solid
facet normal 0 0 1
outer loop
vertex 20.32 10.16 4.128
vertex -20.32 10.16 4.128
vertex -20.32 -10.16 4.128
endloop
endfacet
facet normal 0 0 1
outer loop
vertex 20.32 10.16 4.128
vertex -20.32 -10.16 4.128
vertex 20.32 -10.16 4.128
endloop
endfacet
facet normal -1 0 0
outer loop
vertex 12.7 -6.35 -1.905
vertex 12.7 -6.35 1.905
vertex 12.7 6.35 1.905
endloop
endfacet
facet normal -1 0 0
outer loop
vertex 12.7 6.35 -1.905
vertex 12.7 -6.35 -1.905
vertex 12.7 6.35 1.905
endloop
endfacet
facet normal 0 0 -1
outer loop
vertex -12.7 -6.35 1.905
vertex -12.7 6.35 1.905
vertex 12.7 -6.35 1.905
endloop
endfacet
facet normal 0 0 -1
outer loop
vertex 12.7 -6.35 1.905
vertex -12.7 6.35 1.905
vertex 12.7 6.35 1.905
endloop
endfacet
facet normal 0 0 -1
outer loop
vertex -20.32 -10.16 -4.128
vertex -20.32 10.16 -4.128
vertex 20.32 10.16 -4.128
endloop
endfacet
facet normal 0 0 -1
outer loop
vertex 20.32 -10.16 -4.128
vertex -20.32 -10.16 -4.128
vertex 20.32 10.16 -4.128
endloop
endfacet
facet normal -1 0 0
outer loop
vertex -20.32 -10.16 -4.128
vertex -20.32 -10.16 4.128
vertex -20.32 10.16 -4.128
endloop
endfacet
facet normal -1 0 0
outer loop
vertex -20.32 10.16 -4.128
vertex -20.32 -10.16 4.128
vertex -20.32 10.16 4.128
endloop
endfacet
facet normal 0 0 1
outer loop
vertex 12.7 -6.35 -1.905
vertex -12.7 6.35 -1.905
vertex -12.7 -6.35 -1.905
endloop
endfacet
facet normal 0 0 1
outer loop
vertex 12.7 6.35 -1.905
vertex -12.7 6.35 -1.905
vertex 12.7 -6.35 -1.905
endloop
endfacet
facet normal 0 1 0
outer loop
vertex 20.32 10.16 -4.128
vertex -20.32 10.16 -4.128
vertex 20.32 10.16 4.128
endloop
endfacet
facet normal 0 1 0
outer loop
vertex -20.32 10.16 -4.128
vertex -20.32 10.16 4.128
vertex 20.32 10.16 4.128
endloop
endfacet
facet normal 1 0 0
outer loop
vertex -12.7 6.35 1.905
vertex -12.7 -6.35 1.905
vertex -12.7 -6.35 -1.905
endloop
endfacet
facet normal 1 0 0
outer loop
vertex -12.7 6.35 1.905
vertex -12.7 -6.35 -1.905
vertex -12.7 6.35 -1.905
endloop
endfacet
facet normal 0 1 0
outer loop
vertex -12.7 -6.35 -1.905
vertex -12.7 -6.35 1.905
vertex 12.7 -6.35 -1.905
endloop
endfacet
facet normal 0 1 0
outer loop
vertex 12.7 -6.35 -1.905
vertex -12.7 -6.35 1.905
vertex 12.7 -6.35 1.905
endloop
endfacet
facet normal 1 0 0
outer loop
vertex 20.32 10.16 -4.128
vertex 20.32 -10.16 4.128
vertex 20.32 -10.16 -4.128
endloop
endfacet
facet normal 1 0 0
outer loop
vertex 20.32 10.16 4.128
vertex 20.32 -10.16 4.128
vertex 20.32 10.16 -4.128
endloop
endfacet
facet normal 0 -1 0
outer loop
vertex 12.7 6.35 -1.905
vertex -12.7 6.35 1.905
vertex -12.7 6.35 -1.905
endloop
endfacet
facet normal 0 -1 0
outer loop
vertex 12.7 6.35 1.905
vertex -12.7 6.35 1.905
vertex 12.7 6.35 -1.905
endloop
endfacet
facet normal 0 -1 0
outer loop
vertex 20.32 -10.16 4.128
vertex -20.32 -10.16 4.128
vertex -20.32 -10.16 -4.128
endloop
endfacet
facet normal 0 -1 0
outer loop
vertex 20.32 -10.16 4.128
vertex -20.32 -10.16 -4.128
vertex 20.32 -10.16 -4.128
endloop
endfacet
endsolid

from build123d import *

# Parameters (mm, degrees)
F0_W     = 40.64
F0_H     = 20.32
F1_DEPTH = 4.1275
F2_W     = 25.4
F2_H     = 12.7
F3_DEPTH = 1.905


with BuildPart() as f1:
    # F0 (on Top) → F1 (new body, symmetric)
    with BuildSketch(Plane.XY):
        Rectangle(F0_W, F0_H)
    extrude(amount=F1_DEPTH, both=True)

    # F2 (on Top) → F3 (cut, symmetric)
    with BuildSketch(Plane.XY):
        Rectangle(F2_W, F2_H)
    extrude(amount=F3_DEPTH, both=True, mode=Mode.SUBTRACT)


solid = f1.part
